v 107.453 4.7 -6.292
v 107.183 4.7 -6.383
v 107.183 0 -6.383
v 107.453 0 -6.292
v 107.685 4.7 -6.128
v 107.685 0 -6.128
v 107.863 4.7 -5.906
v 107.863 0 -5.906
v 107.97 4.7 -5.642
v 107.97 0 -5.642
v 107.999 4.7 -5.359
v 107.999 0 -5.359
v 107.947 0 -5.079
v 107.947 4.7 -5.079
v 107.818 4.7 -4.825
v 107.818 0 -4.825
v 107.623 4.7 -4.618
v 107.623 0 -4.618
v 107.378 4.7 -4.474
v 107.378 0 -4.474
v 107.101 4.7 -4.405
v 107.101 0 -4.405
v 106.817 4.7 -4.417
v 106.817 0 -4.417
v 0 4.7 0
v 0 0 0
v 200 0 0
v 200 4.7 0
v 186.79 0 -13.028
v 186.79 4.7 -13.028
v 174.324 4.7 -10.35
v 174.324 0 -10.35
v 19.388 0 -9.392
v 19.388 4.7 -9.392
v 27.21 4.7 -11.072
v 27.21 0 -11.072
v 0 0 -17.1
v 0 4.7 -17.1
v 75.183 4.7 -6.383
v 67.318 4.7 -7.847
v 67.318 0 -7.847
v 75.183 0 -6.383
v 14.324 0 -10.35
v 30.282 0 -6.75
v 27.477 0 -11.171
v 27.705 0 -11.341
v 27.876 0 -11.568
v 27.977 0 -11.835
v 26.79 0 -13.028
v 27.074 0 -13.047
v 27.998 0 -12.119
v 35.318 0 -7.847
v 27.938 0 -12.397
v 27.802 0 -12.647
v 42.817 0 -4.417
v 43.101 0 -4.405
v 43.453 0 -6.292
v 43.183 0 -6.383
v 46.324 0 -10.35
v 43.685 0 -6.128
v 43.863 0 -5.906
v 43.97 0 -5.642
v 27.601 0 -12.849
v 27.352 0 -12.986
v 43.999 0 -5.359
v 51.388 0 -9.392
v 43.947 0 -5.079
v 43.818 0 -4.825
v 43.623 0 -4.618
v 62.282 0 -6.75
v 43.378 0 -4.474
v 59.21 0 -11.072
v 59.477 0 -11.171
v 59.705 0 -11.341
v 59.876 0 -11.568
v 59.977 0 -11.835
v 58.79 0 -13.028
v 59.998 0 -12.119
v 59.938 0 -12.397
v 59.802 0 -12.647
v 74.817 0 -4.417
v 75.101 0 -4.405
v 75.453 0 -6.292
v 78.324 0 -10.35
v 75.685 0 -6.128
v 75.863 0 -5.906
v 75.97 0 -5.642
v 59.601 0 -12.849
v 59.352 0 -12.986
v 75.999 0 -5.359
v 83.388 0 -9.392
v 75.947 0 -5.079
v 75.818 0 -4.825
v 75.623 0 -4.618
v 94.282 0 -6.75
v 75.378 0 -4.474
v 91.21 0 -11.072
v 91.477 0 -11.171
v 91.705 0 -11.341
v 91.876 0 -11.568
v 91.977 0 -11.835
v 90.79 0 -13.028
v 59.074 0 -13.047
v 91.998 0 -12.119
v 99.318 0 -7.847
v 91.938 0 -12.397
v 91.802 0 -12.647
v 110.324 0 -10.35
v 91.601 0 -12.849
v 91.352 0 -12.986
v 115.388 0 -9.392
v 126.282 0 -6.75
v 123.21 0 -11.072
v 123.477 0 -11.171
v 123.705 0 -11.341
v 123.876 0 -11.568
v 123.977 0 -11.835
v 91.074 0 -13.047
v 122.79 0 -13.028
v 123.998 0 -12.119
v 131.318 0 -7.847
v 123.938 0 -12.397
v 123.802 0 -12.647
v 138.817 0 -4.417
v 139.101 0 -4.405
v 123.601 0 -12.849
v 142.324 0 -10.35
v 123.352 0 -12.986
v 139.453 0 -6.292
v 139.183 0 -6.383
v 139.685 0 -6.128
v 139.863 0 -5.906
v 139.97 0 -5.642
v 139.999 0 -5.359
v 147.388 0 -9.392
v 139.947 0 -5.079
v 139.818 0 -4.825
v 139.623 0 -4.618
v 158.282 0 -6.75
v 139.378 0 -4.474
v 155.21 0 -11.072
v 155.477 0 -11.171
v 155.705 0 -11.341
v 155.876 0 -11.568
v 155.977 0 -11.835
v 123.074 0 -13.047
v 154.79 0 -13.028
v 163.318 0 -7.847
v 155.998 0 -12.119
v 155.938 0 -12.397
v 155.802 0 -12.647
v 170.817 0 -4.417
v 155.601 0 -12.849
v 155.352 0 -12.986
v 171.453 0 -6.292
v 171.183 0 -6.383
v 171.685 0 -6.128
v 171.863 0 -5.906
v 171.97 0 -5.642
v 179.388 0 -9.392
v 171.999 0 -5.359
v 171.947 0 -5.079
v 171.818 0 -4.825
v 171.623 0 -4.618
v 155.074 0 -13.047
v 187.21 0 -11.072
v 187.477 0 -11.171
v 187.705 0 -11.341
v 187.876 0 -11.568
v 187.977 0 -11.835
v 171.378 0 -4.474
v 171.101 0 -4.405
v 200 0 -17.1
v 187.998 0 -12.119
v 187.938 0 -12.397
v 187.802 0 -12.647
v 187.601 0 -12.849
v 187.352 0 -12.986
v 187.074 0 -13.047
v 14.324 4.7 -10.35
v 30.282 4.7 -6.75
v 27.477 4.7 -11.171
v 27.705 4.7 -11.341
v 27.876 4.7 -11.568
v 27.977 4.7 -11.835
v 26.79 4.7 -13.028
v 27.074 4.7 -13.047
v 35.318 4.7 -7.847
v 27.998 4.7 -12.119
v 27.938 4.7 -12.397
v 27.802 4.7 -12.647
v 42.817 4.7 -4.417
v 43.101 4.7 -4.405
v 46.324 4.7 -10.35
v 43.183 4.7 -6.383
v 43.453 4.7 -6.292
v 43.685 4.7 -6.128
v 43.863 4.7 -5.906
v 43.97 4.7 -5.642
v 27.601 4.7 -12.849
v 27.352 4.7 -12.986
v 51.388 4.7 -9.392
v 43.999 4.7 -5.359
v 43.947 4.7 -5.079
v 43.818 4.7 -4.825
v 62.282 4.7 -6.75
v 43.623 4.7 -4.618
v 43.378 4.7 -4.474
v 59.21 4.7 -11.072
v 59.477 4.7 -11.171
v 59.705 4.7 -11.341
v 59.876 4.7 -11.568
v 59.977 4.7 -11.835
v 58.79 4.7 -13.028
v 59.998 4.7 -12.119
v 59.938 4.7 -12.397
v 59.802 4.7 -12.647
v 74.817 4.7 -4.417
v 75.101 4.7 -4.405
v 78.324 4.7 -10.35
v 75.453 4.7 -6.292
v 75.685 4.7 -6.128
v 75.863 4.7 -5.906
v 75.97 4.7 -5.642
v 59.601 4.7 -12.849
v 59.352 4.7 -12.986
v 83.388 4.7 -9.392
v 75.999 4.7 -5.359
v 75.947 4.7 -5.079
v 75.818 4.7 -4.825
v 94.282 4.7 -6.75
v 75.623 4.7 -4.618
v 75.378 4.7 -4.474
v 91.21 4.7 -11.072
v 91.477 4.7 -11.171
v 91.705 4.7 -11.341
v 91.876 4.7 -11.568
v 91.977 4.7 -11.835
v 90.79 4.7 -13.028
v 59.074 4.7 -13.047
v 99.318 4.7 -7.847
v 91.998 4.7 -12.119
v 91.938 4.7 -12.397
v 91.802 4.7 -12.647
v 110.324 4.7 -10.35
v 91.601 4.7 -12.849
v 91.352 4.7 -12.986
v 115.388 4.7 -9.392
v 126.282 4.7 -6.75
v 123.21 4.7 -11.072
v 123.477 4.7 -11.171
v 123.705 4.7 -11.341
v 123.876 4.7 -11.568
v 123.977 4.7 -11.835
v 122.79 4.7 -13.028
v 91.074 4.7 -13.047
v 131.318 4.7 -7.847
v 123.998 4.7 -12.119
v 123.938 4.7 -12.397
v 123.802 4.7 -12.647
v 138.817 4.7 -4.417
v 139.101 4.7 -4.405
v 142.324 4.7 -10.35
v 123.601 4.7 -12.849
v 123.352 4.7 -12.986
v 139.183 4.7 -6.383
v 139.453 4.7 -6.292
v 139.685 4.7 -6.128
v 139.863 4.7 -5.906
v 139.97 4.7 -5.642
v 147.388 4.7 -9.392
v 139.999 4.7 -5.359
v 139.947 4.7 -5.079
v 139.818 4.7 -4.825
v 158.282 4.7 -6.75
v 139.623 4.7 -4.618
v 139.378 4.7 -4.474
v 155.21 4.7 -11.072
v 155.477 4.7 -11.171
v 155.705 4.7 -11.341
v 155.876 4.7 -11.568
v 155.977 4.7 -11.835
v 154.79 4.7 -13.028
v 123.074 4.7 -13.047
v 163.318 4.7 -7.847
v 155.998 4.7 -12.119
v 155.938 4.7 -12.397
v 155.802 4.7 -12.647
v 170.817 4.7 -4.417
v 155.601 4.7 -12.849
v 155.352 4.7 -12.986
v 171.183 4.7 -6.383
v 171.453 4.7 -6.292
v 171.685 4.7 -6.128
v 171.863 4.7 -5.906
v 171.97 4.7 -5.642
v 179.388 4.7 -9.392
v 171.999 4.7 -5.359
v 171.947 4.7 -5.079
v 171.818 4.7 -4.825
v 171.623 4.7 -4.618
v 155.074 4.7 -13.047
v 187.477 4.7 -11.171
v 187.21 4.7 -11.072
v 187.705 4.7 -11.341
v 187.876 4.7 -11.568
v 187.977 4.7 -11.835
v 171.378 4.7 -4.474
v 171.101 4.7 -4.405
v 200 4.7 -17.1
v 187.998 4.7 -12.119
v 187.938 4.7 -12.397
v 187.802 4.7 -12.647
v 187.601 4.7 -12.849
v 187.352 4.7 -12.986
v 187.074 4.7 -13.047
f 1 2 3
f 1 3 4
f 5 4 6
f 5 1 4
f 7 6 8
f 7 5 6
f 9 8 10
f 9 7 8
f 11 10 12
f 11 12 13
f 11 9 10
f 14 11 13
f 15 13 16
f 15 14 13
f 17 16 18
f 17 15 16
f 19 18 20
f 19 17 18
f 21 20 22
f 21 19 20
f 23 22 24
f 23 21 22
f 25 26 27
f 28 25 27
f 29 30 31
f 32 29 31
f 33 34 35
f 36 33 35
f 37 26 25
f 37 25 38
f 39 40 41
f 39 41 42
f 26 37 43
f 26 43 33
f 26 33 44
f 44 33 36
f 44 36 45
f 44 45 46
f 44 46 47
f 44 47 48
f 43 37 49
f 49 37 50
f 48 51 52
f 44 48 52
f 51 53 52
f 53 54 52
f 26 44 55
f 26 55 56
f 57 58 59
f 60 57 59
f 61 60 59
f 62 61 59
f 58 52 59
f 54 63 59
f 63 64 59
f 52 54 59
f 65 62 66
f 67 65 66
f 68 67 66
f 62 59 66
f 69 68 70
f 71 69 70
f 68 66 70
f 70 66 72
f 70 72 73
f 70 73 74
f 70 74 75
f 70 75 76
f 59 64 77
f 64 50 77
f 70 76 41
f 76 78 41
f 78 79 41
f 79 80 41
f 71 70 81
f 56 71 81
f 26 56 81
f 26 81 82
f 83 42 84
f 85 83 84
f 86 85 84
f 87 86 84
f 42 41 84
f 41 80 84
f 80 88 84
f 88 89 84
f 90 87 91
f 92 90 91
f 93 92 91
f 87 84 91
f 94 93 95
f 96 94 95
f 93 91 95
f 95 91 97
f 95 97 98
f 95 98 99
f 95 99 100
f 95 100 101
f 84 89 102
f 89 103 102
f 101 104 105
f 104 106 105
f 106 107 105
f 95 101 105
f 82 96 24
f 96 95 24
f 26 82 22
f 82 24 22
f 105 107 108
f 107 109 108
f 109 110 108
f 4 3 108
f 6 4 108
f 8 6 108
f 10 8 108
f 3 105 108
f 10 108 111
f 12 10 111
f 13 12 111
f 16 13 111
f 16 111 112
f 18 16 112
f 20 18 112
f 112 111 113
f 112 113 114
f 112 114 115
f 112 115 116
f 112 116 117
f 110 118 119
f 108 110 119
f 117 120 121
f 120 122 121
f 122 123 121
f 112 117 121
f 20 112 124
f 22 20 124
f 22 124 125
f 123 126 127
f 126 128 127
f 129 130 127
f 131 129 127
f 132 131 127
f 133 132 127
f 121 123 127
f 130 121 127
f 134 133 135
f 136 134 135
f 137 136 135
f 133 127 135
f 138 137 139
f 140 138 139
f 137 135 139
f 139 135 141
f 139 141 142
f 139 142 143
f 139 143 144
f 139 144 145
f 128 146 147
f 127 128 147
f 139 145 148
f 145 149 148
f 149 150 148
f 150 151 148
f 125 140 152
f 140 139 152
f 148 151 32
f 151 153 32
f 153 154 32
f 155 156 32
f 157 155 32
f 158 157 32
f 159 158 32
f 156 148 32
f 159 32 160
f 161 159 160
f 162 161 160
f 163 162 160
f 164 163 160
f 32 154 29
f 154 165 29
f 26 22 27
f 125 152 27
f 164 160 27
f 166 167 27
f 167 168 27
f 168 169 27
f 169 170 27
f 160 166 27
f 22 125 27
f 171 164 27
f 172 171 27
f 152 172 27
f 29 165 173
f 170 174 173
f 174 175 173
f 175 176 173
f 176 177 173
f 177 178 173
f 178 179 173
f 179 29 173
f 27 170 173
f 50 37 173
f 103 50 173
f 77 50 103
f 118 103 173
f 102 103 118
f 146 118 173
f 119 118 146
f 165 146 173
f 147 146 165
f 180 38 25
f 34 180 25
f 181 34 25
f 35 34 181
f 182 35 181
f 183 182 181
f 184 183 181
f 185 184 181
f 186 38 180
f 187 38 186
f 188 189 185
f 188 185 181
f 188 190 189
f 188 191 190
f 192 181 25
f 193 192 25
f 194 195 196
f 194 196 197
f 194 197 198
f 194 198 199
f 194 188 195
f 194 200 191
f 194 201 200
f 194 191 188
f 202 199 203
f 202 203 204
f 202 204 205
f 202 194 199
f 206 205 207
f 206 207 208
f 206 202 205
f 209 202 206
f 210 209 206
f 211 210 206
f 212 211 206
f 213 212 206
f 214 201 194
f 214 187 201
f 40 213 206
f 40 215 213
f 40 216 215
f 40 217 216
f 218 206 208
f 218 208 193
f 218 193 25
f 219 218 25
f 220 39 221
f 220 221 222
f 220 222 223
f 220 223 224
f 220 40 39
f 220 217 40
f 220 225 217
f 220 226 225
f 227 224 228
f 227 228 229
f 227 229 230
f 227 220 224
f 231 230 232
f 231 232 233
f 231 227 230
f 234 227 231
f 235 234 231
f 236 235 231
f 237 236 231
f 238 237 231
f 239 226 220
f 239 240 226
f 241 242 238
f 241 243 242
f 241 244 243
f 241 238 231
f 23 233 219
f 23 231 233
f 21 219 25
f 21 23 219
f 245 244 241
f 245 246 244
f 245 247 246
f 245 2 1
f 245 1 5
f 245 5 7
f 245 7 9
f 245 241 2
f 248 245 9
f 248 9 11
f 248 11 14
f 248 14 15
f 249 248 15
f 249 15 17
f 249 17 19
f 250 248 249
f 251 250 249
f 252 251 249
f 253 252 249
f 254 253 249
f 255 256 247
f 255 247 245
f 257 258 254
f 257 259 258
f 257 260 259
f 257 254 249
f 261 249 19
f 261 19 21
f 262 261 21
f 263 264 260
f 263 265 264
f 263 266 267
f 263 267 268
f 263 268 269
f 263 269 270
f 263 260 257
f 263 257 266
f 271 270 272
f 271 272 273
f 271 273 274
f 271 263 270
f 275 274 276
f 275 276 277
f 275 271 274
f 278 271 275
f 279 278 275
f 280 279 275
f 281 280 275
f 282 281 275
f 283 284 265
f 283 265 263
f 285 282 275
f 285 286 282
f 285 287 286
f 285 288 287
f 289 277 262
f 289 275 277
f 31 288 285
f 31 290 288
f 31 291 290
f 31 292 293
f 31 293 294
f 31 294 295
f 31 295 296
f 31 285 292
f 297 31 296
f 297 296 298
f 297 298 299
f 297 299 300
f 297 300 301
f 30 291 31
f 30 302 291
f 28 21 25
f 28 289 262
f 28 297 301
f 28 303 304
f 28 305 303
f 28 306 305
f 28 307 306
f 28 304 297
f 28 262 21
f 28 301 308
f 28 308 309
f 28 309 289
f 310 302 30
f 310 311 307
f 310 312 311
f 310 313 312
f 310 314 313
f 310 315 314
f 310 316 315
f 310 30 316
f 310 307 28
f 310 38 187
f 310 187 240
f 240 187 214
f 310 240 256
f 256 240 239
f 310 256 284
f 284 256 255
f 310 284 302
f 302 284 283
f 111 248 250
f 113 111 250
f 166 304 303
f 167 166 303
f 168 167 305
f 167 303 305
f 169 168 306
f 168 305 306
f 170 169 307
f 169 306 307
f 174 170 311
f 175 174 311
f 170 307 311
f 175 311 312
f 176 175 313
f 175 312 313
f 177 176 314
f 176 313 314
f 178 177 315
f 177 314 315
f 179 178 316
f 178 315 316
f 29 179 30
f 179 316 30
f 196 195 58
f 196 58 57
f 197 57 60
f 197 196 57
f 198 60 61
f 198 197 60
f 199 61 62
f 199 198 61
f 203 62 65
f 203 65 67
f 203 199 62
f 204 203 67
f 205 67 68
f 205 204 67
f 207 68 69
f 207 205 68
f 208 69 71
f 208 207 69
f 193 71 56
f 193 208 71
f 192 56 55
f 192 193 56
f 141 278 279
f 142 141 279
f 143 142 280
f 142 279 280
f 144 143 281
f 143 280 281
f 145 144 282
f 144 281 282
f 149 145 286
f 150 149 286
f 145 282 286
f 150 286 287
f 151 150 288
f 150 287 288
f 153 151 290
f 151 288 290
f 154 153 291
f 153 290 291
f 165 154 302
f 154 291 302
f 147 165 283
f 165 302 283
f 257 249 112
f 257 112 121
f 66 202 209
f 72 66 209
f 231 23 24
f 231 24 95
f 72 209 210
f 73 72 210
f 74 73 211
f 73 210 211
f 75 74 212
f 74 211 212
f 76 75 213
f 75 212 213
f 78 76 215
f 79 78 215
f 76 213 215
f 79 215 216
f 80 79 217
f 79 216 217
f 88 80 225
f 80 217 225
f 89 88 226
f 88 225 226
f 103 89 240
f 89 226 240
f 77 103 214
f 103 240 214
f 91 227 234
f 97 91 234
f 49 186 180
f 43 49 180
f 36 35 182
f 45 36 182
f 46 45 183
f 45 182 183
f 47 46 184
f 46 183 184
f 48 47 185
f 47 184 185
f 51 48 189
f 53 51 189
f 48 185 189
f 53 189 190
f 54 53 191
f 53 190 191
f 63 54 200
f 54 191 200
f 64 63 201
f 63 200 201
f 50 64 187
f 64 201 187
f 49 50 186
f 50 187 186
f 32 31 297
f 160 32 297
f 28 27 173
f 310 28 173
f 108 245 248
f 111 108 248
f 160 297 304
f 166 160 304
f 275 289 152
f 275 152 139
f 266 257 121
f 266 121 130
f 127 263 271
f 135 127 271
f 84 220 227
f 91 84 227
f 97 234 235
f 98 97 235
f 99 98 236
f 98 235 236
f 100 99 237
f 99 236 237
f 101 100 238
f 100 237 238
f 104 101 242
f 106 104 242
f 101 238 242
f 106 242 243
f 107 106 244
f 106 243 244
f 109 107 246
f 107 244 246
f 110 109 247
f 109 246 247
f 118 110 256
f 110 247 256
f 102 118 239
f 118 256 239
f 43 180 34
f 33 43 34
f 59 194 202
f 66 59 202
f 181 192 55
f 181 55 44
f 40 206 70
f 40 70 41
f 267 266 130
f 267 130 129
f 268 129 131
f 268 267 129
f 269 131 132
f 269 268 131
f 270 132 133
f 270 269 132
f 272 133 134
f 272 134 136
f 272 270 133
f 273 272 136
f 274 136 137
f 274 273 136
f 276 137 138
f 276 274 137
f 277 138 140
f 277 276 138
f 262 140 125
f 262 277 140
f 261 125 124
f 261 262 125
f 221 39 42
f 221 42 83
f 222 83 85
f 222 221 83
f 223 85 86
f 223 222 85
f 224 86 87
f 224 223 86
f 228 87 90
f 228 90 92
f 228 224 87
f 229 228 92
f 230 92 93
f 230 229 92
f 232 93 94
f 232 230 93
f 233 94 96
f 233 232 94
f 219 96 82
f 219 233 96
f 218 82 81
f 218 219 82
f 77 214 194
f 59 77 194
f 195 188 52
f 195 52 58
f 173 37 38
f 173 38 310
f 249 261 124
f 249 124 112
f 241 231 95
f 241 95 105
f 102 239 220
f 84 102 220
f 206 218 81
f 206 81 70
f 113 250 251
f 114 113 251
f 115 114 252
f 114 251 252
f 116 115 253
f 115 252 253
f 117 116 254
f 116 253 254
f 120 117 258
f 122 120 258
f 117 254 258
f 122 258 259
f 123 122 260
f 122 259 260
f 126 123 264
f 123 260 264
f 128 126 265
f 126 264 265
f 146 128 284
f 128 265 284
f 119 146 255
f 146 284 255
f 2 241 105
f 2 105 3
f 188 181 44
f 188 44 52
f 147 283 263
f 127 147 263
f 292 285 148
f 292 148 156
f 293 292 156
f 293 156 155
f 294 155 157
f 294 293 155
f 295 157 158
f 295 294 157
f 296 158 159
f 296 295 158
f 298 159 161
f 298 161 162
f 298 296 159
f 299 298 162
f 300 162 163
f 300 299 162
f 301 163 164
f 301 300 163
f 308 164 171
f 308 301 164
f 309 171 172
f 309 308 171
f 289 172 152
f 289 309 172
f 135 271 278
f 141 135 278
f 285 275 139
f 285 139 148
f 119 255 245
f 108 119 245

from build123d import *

# Parameters (mm, degrees)
SKETCH1_W           = 200
SKETCH1_H           = 17.1
BOSS_EXTRUDE1_DEPTH = 4.7
CUT_EXTRUDE1_DEPTH  = 4.7
LPATTERN1_COUNT     = 6
LPATTERN1_PITCH     = 32
CUT_EXTRUDE2_DEPTH  = 4.7
LPATTERN2_COUNT     = 5
LPATTERN2_PITCH     = 32


with BuildPart() as part:
    # Sketch1 → Boss-Extrude1 (new body)
    with BuildSketch(Plane(origin=(0, 0, 0), x_dir=(1, 0, 0), z_dir=(0, 1, 0))):
        with Locations((100, 8.55)):
            Rectangle(SKETCH1_W, SKETCH1_H)
    extrude(amount=BOSS_EXTRUDE1_DEPTH)

    # Sketch2 → Cut-Extrude1 (cut)
    with BuildSketch(Plane(origin=(0, 4.7, 0), x_dir=(1, 0, 0), z_dir=(0, 1, 0))):
        with BuildLine():
            Line((26.789984467, 13.027698049), (14.324334337, 10.35))
            Line((14.324334337, 10.35), (19.388431138, 9.392177684))
            Line((19.388431138, 9.392177684), (27.210015533, 11.072301951))
            ThreePointArc((27.210015533, 11.072301951), (27.977698049, 12.260015533), (26.789984467, 13.027698049))
        make_face()
    cut_extrude1 = extrude(amount=-CUT_EXTRUDE1_DEPTH, mode=Mode.SUBTRACT)

    # LPattern1: Cut-Extrude1 ×6
    with Locations(*[(i * LPATTERN1_PITCH, 0, 0) for i in range(1, LPATTERN1_COUNT)]):
        add(cut_extrude1, mode=Mode.SUBTRACT)

    # Sketch3 → Cut-Extrude2 (cut)
    with BuildSketch(Plane(origin=(0, 4.7, 0), x_dir=(1, 0, 0), z_dir=(0, 1, 0))):
        with BuildLine():
            Line((42.817010597, 4.416885114), (30.282295805, 6.75))
            Line((30.282295805, 6.75), (35.318070317, 7.847030108))
            Line((35.318070317, 7.847030108), (43.182989403, 6.383114886))
            ThreePointArc((43.182989403, 6.383114886), (43.983114886, 5.217010597), (42.817010597, 4.416885114))
        make_face()
    cut_extrude2 = extrude(amount=-CUT_EXTRUDE2_DEPTH, mode=Mode.SUBTRACT)

    # LPattern2: Cut-Extrude2 ×5
    with Locations(*[(i * LPATTERN2_PITCH, 0, 0) for i in range(1, LPATTERN2_COUNT)]):
        add(cut_extrude2, mode=Mode.SUBTRACT)


solid = part.part
